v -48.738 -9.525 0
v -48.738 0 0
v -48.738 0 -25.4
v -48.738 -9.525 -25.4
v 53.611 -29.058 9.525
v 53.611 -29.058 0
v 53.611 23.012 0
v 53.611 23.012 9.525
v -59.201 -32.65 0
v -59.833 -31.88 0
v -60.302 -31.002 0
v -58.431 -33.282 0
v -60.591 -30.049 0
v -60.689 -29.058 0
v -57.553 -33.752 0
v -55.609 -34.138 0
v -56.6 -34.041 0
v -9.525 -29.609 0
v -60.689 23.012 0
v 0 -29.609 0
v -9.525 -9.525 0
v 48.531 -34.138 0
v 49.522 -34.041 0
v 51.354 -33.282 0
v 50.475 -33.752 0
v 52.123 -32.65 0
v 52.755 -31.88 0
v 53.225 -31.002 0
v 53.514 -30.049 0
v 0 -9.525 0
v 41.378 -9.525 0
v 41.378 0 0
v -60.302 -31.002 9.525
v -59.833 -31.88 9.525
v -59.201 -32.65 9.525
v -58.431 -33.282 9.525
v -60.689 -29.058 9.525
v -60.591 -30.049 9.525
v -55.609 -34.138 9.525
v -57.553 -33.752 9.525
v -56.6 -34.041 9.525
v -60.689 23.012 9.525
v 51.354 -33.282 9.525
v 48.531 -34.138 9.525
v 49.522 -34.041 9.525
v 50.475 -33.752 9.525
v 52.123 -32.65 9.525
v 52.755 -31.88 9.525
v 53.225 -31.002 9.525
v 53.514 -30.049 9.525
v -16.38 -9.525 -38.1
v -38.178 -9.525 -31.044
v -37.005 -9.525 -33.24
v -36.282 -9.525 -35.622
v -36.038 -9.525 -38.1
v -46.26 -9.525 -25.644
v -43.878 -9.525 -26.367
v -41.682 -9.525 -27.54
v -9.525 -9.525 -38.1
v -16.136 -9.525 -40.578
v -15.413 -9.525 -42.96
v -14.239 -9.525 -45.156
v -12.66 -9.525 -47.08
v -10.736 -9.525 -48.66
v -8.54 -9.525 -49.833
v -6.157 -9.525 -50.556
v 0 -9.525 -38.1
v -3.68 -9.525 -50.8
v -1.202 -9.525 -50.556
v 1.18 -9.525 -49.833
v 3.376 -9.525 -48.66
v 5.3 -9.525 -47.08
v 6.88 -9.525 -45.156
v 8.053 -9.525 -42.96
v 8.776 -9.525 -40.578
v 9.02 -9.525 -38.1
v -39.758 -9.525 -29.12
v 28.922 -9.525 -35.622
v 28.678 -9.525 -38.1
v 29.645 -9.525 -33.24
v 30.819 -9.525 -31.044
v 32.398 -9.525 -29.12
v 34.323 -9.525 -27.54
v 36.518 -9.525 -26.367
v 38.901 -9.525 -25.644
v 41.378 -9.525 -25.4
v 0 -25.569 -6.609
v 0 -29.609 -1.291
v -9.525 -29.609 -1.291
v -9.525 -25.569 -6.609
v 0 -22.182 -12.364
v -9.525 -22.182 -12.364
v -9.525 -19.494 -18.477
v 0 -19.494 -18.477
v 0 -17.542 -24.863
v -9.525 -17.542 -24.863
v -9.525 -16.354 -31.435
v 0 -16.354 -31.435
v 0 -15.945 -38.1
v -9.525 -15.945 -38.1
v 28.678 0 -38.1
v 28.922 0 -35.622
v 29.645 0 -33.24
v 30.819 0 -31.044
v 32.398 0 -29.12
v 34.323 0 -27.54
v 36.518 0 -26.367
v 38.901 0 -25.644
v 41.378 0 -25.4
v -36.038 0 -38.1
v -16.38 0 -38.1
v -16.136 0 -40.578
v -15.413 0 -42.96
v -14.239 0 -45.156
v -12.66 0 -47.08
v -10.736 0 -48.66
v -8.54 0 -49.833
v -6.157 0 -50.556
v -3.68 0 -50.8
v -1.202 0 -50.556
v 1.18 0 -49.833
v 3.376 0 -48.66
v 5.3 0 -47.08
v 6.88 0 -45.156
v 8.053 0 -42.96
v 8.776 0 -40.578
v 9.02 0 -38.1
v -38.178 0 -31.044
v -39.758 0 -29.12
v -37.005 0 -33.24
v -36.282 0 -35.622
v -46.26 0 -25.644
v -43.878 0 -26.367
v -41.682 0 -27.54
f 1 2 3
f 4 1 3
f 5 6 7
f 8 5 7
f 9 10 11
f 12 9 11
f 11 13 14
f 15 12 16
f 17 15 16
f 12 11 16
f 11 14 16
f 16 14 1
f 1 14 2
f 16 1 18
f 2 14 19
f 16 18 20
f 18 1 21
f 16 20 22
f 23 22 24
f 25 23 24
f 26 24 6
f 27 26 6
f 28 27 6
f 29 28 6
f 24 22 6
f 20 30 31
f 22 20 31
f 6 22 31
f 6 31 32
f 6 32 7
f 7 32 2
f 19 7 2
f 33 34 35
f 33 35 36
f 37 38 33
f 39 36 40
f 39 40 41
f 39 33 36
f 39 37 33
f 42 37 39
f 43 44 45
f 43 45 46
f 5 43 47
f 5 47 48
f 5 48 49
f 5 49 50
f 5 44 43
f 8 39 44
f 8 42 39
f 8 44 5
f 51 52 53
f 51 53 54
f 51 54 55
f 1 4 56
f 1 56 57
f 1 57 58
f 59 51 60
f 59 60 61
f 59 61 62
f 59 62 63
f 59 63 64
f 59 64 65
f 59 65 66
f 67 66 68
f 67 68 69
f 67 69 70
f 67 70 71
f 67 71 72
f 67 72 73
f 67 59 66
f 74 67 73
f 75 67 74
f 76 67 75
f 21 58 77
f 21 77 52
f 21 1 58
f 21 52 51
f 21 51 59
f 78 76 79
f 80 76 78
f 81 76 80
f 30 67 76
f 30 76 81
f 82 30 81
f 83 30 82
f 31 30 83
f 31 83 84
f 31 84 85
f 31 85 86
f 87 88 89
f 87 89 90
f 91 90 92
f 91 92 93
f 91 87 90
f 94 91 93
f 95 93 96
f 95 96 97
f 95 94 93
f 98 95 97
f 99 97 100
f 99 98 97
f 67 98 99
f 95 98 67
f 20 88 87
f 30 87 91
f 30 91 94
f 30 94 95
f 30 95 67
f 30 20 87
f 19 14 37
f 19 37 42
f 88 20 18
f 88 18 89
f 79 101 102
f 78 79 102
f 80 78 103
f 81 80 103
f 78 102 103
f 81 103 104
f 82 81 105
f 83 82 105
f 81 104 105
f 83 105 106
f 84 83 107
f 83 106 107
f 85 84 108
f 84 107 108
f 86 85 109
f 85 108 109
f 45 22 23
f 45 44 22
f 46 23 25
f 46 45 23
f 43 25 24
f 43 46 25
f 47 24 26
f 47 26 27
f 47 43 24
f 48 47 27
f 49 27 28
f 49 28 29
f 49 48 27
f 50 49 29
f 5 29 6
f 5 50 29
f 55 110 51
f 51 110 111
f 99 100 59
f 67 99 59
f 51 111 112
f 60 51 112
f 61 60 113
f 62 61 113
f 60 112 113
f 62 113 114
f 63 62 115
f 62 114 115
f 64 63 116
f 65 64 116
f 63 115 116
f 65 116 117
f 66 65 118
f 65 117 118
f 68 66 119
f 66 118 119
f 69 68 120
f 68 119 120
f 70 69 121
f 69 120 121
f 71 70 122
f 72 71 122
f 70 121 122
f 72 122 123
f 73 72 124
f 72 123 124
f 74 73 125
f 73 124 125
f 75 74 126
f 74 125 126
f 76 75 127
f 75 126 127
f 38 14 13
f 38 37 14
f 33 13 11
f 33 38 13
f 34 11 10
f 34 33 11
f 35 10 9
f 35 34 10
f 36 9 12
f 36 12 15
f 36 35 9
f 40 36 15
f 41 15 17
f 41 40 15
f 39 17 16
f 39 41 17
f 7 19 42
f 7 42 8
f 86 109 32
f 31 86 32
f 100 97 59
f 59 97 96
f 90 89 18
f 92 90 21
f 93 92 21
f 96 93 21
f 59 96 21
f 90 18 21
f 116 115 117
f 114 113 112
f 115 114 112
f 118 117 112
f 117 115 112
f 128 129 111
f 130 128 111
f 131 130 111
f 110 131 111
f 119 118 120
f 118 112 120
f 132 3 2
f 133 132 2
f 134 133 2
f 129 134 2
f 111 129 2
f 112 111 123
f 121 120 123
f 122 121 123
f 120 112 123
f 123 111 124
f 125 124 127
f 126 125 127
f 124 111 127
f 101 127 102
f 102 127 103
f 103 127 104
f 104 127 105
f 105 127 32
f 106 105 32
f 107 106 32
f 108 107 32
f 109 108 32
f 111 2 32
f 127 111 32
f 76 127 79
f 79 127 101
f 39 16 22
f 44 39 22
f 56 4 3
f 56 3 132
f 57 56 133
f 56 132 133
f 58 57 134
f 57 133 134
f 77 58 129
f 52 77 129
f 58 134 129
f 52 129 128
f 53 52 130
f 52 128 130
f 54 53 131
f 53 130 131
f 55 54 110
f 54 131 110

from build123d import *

# Parameters (mm, degrees)
F0_W     = 114.3
F0_H     = 57.15
F1_DEPTH = 9.525
F2_R     = 5.08
F4_DEPTH = 9.525
F6_DEPTH = 9.525


with BuildPart() as f1:
    # F0 (on Top) → F1 (new body)
    with BuildSketch(Plane.XY):
        with Locations((-3.538748, -5.563198)):
            Rectangle(F0_W, F0_H)
    extrude(amount=F1_DEPTH)

    # F2
    f2_edges = [f1.edges().sort_by_distance(p)[0] for p in [
        (-60.688748, -34.138198, 4.7625),
        (53.611252, -34.138198, 4.7625),
    ]]
    fillet(f2_edges, radius=F2_R)

    # F3 (on Front) → F4 (join)
    with BuildSketch(Plane.XZ):
        with BuildLine():
            Line((41.378355, 0), (-48.737979, 0))
            Line((-48.737979, 0), (-48.737979, -25.4))
            ThreePointArc((-48.737979, -25.4), (-39.757723, -29.119744), (-36.037979, -38.1))
            Line((-36.037979, -38.1), (-16.379812, -38.1))
            ThreePointArc((-16.379812, -38.1), (-3.679812, -50.8), (9.020188, -38.1))
            Line((9.020188, -38.1), (28.678355, -38.1))
            ThreePointArc((28.678355, -38.1), (32.398099, -29.119744), (41.378355, -25.4))
            Line((41.378355, -25.4), (41.378355, 0))
        make_face()
    extrude(amount=F4_DEPTH)

    # F5 (on Right) → F6 (join)
    with BuildSketch(Plane.YZ):
        with BuildLine():
            Line((-9.288505, -38.1), (-9.288505, 0))
            Line((-9.288505, 0), (-29.608505, 0))
            Line((-29.608505, 0), (-29.608505, -1.29146))
            ThreePointArc((-29.608505, -1.29146), (-19.493946, -18.477158), (-15.944775, -38.1))
            Line((-15.944775, -38.1), (-9.288505, -38.1))
        make_face()
    extrude(amount=-F6_DEPTH)


solid = f1.part
